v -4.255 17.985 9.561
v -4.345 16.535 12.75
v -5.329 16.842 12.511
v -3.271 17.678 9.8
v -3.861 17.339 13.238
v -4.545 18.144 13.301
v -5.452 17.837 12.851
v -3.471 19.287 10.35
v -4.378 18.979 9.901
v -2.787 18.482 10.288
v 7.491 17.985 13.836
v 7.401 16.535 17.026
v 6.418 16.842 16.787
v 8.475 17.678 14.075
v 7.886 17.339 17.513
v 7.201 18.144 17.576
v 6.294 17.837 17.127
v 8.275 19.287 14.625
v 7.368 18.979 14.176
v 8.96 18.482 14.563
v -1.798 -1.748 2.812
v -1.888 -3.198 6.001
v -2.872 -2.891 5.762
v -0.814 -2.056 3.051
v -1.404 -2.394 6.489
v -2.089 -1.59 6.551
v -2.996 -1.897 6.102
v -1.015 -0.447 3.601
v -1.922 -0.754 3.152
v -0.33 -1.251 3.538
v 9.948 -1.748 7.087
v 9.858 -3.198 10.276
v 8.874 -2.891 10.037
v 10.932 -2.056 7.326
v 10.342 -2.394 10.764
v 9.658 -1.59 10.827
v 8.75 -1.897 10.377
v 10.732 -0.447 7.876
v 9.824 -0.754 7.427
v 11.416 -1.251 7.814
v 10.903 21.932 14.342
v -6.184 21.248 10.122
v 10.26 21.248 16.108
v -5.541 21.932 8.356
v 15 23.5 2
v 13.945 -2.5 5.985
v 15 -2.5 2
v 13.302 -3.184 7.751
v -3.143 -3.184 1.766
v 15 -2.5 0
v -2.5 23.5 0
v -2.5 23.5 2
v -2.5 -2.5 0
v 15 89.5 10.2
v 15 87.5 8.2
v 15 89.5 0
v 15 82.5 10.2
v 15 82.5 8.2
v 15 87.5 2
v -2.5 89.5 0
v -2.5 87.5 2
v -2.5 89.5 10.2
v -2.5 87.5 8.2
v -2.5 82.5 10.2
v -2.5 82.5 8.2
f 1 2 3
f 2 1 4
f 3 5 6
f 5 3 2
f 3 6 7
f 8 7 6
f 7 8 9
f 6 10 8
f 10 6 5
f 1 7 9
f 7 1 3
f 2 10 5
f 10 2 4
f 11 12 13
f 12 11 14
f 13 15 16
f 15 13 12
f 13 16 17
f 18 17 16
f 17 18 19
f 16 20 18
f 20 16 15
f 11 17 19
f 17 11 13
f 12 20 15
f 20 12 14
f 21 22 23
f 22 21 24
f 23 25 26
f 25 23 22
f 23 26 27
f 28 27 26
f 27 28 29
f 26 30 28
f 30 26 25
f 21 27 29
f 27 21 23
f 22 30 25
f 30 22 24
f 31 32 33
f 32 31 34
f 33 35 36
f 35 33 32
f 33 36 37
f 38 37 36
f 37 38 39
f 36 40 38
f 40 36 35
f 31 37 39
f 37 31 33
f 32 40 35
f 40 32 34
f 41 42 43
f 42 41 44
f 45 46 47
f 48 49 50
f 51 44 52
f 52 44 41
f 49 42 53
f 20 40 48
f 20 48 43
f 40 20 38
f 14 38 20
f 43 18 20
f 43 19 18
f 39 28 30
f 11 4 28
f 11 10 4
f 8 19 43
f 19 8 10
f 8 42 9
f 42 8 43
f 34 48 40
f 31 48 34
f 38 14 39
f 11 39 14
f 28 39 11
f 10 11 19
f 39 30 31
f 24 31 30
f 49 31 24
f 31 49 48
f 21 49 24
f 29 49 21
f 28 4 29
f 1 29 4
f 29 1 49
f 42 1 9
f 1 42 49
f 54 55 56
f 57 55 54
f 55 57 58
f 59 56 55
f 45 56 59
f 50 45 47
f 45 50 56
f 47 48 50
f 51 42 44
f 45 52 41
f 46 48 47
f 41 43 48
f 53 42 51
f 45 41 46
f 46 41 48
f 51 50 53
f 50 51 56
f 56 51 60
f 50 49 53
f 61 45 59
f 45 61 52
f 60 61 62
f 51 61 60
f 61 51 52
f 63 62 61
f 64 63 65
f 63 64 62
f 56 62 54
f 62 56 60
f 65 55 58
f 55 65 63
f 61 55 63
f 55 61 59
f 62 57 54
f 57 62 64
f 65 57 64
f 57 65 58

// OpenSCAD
wall_thickness = 6.2;
thickness = 2;
height_offset = 66;

right_rotation = 20;
down_rotation  = 20;

rotate([down_rotation,-right_rotation,0])
translate([0,0,thickness]){

    cylinder(h=5, d=1.8);
    translate([12.5,0,0]) cylinder(h=5, d=1.8);

    translate([0,21,0]) {
        cylinder(h=5, d=1.8);
        translate([12.5,0,0]) cylinder(h=5, d=1.8);    
        }
}

    
    
translate([-5/2,-5/2,0]){
    hull() {
    rotate([down_rotation,-right_rotation,0]) cube([12.5+5, 21+5, 2]);
    cube([12.5+5, 21+5, 2]);
    }
    translate([0, 21+5, 0]) cube([12.5+5, height_offset, 2]);
    translate([0,21+5+height_offset-thickness,thickness]) #cube([12.5+5,thickness,wall_thickness]);
    translate([0,21+height_offset-thickness,wall_thickness+thickness]) cube([12.5+5,5+thickness,thickness]);
    }
